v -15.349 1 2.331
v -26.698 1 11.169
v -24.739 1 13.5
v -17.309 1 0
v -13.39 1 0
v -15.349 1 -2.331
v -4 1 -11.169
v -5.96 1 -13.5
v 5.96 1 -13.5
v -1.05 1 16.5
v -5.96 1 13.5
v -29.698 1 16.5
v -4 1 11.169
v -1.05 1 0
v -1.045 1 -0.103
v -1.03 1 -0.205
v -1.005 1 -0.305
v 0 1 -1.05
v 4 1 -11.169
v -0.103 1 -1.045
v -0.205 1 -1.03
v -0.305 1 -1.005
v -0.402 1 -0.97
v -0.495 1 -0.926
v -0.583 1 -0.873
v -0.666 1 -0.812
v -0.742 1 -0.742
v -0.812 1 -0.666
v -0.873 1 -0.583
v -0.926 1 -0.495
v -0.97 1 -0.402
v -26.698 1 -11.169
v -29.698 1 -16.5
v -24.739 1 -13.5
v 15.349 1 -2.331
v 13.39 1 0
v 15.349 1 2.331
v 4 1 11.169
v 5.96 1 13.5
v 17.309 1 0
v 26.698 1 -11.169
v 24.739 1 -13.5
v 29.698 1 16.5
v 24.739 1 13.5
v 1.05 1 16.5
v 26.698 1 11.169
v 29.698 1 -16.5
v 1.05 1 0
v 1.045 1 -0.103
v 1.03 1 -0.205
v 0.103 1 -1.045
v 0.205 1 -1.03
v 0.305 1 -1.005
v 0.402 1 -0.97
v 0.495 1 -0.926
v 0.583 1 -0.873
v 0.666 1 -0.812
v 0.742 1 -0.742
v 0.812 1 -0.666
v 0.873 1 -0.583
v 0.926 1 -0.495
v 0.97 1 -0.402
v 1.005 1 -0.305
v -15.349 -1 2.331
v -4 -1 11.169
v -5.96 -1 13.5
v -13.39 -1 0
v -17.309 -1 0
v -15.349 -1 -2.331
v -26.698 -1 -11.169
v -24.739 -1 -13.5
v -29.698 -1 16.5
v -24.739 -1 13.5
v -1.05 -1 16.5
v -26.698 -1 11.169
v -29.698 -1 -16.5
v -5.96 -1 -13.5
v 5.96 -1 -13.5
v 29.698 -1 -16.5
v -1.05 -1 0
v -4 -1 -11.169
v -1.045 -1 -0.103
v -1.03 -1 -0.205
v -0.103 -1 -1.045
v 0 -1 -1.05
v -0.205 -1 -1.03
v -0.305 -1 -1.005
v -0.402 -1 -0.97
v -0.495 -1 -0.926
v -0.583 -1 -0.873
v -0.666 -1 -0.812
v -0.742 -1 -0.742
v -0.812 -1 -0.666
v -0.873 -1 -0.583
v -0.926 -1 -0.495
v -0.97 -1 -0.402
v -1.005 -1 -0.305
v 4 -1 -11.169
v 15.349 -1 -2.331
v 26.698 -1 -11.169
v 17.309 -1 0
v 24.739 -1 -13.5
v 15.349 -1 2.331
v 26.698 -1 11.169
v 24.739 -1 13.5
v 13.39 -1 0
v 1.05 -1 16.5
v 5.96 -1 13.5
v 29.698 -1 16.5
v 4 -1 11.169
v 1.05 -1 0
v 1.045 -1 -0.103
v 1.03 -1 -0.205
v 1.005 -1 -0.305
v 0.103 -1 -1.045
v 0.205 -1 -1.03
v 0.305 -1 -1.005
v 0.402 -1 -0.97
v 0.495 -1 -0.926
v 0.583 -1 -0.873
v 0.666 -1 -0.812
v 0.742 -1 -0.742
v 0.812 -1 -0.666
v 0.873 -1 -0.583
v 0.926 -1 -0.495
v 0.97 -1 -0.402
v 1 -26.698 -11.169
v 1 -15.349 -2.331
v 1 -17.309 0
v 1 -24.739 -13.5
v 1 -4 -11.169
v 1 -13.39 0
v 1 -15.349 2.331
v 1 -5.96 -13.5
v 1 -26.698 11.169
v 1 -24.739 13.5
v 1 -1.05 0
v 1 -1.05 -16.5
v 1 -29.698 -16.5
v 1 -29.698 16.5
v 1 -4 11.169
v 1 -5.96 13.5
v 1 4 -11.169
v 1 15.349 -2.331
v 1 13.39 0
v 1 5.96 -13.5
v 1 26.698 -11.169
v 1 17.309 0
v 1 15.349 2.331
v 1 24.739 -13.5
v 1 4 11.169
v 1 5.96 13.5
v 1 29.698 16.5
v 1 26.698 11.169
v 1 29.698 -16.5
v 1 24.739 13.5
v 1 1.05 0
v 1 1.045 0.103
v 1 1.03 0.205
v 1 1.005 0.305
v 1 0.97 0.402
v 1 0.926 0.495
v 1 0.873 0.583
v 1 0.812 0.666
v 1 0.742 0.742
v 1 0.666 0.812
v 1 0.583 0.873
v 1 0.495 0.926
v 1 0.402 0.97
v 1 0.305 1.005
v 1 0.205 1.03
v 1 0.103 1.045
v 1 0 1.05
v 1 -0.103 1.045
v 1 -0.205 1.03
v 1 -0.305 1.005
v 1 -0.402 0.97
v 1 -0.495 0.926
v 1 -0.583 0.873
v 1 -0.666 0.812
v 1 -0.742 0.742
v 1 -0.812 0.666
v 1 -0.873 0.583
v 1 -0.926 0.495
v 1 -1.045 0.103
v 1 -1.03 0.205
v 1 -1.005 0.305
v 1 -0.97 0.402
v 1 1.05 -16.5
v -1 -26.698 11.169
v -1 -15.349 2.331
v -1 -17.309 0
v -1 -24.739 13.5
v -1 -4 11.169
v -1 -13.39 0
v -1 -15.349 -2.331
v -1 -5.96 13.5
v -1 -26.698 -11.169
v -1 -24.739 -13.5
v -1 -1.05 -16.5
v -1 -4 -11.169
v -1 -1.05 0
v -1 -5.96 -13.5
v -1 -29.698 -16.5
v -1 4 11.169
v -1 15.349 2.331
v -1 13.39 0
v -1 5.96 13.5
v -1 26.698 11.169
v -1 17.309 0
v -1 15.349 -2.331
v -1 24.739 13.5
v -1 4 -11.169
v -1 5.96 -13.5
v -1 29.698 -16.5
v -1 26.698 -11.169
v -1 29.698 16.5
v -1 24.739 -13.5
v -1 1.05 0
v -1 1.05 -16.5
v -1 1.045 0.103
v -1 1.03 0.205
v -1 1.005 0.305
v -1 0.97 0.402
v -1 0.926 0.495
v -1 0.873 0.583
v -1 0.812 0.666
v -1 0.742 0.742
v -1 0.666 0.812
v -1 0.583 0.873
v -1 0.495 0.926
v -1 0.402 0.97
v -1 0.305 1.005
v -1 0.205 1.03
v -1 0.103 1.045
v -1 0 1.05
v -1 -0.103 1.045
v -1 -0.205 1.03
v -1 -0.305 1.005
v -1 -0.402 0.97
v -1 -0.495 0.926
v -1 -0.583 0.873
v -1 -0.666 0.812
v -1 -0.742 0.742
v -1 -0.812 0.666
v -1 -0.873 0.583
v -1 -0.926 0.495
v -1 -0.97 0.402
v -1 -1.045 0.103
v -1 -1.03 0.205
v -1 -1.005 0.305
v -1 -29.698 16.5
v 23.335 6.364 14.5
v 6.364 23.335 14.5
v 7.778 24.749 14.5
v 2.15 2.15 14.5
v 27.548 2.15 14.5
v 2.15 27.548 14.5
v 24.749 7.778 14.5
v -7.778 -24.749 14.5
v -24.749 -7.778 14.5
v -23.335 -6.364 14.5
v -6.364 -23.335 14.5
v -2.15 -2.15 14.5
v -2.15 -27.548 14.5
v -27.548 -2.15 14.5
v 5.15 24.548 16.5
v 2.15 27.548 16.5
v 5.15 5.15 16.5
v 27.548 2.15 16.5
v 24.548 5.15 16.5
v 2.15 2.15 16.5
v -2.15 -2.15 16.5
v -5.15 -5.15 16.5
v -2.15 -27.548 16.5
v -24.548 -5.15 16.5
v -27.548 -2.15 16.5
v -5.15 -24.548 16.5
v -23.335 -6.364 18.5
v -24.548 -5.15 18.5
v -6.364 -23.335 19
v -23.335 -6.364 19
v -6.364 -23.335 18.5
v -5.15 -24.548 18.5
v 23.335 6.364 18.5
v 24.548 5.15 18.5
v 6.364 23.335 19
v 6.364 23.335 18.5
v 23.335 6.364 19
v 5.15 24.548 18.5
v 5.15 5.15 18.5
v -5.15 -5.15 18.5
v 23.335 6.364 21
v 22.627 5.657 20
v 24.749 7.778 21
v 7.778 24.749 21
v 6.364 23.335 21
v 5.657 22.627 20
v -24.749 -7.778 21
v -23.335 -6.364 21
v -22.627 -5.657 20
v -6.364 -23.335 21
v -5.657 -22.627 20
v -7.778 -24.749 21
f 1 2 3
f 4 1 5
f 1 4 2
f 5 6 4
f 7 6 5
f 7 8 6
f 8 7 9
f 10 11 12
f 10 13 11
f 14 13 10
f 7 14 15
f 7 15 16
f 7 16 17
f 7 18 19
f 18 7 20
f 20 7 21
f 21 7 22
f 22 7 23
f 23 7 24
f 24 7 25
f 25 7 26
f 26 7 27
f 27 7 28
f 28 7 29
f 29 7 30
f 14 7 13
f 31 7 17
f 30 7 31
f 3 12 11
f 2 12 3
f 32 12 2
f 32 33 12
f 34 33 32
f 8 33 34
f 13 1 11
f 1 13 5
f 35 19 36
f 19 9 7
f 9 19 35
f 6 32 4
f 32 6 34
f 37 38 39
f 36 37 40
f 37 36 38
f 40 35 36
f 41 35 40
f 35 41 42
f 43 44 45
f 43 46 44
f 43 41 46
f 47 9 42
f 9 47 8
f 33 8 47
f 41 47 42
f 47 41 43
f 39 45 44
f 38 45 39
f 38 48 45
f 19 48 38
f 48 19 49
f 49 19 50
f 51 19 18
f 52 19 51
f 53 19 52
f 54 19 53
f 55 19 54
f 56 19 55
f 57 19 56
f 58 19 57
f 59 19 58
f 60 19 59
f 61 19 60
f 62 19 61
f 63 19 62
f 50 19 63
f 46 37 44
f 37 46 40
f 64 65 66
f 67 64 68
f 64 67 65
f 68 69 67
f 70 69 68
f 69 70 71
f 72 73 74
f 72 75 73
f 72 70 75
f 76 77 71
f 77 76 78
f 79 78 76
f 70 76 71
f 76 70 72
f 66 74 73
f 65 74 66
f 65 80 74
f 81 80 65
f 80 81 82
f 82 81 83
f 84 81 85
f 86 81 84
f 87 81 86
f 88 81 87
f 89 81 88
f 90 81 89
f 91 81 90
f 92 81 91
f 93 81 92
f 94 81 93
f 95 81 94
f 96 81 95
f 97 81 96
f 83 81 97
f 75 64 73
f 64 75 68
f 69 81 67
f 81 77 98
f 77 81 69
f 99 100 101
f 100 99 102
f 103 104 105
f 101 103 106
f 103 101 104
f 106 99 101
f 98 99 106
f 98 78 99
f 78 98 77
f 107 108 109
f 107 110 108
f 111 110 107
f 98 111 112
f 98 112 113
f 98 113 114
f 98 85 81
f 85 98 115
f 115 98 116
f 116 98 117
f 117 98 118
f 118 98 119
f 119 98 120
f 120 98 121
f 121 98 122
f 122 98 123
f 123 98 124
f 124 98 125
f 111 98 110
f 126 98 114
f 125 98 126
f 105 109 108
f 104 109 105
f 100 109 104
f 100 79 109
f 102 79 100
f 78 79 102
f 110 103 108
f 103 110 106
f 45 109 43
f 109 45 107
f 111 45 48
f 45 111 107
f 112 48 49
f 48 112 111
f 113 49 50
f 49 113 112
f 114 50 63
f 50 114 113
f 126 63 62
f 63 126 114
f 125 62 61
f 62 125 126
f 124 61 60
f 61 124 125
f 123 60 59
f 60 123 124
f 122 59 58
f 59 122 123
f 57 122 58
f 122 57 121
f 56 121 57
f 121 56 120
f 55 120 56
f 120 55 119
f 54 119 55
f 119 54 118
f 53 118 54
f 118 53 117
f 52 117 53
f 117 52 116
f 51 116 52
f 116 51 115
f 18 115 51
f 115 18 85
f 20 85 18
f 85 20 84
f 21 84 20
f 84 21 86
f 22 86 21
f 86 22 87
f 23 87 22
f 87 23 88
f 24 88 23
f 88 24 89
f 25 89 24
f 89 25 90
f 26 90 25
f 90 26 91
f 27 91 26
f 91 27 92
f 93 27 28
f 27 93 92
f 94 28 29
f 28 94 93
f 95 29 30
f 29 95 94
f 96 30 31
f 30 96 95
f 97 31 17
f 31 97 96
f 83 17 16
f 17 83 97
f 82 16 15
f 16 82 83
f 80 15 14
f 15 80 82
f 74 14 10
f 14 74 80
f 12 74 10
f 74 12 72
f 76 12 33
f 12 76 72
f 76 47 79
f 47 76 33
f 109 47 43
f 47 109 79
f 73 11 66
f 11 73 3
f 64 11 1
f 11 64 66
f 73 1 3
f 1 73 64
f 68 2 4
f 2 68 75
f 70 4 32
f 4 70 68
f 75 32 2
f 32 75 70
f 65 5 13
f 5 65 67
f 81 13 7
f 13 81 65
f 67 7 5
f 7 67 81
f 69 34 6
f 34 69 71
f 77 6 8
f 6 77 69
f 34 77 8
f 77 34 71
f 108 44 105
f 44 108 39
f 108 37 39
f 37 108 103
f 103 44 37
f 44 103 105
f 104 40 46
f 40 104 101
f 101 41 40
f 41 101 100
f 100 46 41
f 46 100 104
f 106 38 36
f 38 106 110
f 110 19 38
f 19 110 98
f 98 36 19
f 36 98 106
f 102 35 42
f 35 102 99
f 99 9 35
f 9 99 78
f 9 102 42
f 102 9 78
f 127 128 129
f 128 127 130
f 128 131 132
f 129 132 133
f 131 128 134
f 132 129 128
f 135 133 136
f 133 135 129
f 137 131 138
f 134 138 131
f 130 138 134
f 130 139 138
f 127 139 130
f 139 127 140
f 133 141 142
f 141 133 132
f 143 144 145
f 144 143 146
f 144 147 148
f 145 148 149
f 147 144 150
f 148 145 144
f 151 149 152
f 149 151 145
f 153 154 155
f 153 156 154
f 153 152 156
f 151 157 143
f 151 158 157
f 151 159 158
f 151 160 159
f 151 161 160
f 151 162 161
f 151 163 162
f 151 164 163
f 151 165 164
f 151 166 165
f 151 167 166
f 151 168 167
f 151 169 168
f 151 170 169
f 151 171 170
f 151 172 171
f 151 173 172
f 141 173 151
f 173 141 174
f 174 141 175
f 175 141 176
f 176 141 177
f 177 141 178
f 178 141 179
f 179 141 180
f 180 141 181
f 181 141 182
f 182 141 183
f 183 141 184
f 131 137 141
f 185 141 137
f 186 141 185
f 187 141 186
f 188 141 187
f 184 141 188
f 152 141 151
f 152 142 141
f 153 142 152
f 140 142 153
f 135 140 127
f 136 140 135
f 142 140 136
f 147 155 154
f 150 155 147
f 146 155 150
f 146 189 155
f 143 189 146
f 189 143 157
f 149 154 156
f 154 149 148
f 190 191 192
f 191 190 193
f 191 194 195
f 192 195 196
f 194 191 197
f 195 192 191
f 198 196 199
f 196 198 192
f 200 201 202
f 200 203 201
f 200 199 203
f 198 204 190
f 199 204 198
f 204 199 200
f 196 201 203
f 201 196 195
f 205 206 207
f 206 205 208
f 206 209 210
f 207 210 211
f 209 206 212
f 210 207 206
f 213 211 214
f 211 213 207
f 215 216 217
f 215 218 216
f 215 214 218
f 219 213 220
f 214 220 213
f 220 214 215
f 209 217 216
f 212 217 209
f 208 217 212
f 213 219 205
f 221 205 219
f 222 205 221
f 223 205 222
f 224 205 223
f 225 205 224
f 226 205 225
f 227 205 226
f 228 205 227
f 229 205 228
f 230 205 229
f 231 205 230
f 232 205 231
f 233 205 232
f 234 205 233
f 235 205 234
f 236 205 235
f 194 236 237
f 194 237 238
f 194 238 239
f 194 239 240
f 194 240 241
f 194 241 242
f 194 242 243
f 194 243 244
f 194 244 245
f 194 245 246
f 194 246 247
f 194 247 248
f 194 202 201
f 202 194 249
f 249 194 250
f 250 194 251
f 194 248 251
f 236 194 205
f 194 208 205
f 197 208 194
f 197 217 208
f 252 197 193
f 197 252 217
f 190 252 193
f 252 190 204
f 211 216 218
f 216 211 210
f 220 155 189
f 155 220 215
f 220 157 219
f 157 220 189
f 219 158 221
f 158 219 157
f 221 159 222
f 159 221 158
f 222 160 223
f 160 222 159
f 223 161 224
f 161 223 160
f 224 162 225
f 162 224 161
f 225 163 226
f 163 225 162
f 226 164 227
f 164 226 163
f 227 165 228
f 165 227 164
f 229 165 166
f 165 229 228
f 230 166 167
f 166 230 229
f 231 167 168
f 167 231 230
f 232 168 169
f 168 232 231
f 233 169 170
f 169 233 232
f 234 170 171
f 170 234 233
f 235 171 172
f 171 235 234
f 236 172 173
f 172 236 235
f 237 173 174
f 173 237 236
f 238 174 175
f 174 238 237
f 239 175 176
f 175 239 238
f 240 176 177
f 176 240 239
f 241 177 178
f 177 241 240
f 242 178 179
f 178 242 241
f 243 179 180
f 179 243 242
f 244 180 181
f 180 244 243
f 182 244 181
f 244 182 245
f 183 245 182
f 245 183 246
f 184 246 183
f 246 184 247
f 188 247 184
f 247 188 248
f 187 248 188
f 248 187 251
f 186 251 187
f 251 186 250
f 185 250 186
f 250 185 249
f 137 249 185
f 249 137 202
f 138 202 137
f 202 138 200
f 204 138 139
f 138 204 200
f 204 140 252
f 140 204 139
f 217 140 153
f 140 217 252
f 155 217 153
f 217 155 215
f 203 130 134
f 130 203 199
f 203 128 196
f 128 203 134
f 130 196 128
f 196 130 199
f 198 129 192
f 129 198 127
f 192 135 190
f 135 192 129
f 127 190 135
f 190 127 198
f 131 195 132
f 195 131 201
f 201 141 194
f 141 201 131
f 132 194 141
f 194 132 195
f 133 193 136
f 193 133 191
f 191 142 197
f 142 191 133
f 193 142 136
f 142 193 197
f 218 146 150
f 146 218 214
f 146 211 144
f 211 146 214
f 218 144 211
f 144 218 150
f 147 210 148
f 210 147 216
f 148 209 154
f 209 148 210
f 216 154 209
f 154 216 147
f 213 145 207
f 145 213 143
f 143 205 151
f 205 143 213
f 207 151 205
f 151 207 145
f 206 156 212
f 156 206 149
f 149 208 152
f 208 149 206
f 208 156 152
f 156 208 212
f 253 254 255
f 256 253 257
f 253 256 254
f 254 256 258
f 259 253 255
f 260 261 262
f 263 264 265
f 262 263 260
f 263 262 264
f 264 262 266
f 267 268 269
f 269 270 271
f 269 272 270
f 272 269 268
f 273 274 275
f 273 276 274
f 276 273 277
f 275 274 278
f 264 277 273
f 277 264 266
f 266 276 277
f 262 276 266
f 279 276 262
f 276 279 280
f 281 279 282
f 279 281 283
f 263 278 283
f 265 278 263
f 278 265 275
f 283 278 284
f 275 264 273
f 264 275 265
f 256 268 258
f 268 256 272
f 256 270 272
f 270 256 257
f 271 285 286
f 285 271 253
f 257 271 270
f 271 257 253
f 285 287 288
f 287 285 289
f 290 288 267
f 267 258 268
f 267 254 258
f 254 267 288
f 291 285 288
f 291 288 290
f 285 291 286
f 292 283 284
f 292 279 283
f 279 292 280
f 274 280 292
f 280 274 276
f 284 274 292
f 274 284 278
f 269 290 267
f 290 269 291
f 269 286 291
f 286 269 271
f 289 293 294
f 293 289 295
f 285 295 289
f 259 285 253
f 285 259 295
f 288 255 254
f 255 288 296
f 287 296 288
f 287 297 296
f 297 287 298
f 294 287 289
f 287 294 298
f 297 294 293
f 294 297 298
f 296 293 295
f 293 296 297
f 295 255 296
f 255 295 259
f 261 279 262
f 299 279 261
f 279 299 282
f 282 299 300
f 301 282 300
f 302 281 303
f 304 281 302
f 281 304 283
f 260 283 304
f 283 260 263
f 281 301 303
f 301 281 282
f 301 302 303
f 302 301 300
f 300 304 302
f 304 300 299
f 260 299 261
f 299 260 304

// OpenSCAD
$fn = $preview? 16: 64;

stage_height = 35;
stage_width = 42;
stage_length = stage_width;
stage_thickness = 2;
stage_leg_socket_height = 5;
stage_leg_socket_thickness = 1;
stage_flange_height = 2;
leg_height = stage_height - stage_thickness;
leg_width = sqrt(stage_width ^ 2 + stage_length ^ 2);
leg_thickness = 2;
leg_frame_width = 3;
leg_brace_width = 3;
center_hole_length = 2;
rail_fence_height = 2;
rail_fence_radius = 1;

module leg() {
  module half() {
    hole_width = (leg_width - leg_thickness) / 2 - 2 * leg_frame_width;
    hole_height = leg_height - 2 * leg_frame_width;
    hole_center = [- leg_thickness / 2 - leg_frame_width - hole_width / 2, 0];
    module brace() {
      brace_length = sqrt(hole_width ^ 2 + hole_height ^ 2);
      square([leg_brace_width, brace_length], center = true);
    }
    linear_extrude(leg_thickness) {
      difference() {
        square([leg_width, leg_height], center = true);
        translate([0, leg_height / 4]) square([leg_thickness + 0.1, leg_height / 2], center = true);
        circle(d = leg_thickness + 0.1);
        translate(hole_center) square([hole_width, leg_height - 2 * leg_frame_width], center = true);
      }
      translate(hole_center) rotate(atan2(hole_width, hole_height)) brace();
      translate(hole_center) rotate(atan2(- hole_width, hole_height)) brace();
    }
  }
  intersection() { half(); mirror([1, 0, 0]) half(); }
}

module lower_stage() {
  linear_extrude(stage_thickness)
    intersection() { square([stage_width, stage_length], center = true);
      union() {
        rotate([0, 0, 45]) square([leg_width, 10], center = true);
        rotate([0, 0, 135]) square([leg_width, 10], center = true);
      }
    }
  module leg_socket() {
    linear_extrude(stage_leg_socket_height)
      intersection() {
        difference() {
          union() {
            rotate([0, 0, 45]) square([leg_width, leg_thickness + 2 * stage_leg_socket_thickness], center = true);
            rotate([0, 0, 135]) square([leg_width, leg_thickness + 2 * stage_leg_socket_thickness], center = true);
          }
          rotate([0, 0, 45]) square([leg_width, leg_thickness + 0.5], center = true);
          rotate([0, 0, 135]) square([leg_width, leg_thickness + 0.5], center = true);
        }
        square([stage_width, stage_length], center = true);
      }
  }
  translate([0, 0, stage_thickness]) leg_socket();
}

module upper_stage() {
  allowance = 0.3;
  linear_extrude(stage_flange_height)
    difference() {
      square([stage_width, stage_length], center = true);
      rotate([0, 0, 45]) square([leg_width, leg_thickness + 2 * stage_leg_socket_thickness + allowance], center = true);
      rotate([0, 0, 135]) square([leg_width, leg_thickness + 2 * stage_leg_socket_thickness + allowance], center = true);
      rotate([0, 0, 45]) square([stage_width, stage_length]);
      rotate([0, 0, 225]) square([stage_width, stage_length]);
    }
  translate([0, 0, stage_flange_height])
    linear_extrude(stage_thickness)
      difference() {
        square([stage_width, stage_length], center = true);
        rotate([0, 0, 45]) square([leg_width, 10 + allowance], center = true);
        rotate([0, 0, 135]) square([leg_width, 10 + allowance], center = true);
        rotate([0, 0, 45]) square([stage_width, stage_length]);
        rotate([0, 0, 225]) square([stage_width, stage_length]);
      }
  module rail_pin() {
    linear_extrude(rail_pin_height)
      difference() {
        circle(r = rail_pin_hole_radius + rail_pin_thickness);
        circle(r = rail_pin_hole_radius);
        square([0.5, 2 * (rail_pin_hole_radius + rail_pin_thickness)], center = true);
      }
  }
  module rail_fence() {
    rotate([90, 0, 0]) linear_extrude(24, center = true) {
      translate([0, stage_thickness + stage_flange_height]) polygon([[0, 0], [2, 0], [2, 0.5] ,[3, 1.5], [2, 2.5], [0, 2.5]]);
      square([2, stage_thickness + stage_flange_height]);
    }
  }
  translate([stage_width / 2 + 2, 0]) rotate([0, 0, 180]) rail_fence();
  translate([- stage_width / 2 - 2, 0]) rail_fence();
}

module all() {
  color("khaki") rotate([90, 0, 0]) translate([0, 0, - leg_thickness / 2]) leg();
  color("gold") rotate([0, 270, 0]) rotate([0, 0, 90]) translate([0, 0, - leg_thickness / 2]) leg();
  color("olive") % translate([0, 0, leg_height / 2 + stage_thickness]) rotate([180, 0, 45]) lower_stage();
  color("yellow") translate([0, 0, leg_height / 2 - stage_thickness]) rotate([0, 0, 45]) upper_stage();
}

all();
